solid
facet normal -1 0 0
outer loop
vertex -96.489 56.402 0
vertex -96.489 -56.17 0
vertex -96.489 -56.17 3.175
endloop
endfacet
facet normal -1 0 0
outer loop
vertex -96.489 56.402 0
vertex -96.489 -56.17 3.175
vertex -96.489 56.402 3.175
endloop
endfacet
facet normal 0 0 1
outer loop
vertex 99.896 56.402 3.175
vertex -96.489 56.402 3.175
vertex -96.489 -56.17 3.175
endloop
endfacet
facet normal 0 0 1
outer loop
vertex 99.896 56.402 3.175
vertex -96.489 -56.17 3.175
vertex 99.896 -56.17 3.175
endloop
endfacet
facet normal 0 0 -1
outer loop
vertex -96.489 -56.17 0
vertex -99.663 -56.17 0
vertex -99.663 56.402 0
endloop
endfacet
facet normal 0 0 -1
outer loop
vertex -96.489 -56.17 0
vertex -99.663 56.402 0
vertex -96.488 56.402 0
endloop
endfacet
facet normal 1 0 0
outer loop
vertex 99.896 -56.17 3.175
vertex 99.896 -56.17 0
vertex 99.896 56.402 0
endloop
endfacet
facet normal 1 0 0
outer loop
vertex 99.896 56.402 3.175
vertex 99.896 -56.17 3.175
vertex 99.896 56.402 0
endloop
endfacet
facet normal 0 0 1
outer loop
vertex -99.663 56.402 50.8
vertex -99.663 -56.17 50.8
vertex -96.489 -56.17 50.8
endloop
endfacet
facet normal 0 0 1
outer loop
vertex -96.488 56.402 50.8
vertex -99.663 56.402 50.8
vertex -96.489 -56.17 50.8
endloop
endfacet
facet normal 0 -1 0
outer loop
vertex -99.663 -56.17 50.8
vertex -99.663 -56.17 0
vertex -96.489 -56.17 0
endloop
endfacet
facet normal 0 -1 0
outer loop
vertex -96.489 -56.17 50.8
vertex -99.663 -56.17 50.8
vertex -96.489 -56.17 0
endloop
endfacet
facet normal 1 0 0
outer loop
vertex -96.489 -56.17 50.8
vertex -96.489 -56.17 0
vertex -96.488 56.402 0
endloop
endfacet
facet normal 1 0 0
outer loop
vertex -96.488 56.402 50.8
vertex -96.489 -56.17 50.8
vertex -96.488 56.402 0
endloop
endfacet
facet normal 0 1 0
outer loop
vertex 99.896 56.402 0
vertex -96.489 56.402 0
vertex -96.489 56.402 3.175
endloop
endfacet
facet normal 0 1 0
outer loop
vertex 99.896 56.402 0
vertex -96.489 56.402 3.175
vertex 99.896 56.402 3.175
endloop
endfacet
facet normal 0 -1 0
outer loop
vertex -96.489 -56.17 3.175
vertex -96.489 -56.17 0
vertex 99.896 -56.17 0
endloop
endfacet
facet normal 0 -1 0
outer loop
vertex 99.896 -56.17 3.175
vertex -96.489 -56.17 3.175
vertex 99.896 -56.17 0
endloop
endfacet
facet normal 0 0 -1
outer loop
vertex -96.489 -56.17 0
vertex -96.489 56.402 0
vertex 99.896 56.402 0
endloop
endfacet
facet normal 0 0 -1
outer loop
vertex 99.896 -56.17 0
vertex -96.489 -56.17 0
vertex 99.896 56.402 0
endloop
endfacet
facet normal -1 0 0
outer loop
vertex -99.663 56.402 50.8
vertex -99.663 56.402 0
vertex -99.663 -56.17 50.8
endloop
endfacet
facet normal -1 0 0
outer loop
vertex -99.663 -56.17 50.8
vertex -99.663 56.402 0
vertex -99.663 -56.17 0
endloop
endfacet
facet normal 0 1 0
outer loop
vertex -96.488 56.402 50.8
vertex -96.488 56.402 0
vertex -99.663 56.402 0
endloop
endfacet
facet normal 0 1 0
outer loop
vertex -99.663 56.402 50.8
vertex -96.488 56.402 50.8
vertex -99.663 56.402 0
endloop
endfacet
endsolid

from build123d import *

# Parameters (mm, degrees)
F0_W     = 196.38483
F0_H     = 112.572212
F1_DEPTH = 3.175
F3_DEPTH = 50.8


with BuildPart() as f1:
    # F0 (on Top) → F1 (new body)
    with BuildSketch(Plane.XY):
        with Locations((1.703792, 0.116294)):
            Rectangle(F0_W, F0_H)
    extrude(amount=F1_DEPTH)


with BuildPart() as f3:
    # F2 (on Top) → F3 (new body)
    with BuildSketch(Plane.XY):
        Polygon((-96.488298, 56.402445), (-99.663298, 56.402445), (-99.663298, -56.169771), (-96.488588, -56.169771), align=None)
    extrude(amount=F3_DEPTH)


solid = Compound([f1.part, f3.part])
